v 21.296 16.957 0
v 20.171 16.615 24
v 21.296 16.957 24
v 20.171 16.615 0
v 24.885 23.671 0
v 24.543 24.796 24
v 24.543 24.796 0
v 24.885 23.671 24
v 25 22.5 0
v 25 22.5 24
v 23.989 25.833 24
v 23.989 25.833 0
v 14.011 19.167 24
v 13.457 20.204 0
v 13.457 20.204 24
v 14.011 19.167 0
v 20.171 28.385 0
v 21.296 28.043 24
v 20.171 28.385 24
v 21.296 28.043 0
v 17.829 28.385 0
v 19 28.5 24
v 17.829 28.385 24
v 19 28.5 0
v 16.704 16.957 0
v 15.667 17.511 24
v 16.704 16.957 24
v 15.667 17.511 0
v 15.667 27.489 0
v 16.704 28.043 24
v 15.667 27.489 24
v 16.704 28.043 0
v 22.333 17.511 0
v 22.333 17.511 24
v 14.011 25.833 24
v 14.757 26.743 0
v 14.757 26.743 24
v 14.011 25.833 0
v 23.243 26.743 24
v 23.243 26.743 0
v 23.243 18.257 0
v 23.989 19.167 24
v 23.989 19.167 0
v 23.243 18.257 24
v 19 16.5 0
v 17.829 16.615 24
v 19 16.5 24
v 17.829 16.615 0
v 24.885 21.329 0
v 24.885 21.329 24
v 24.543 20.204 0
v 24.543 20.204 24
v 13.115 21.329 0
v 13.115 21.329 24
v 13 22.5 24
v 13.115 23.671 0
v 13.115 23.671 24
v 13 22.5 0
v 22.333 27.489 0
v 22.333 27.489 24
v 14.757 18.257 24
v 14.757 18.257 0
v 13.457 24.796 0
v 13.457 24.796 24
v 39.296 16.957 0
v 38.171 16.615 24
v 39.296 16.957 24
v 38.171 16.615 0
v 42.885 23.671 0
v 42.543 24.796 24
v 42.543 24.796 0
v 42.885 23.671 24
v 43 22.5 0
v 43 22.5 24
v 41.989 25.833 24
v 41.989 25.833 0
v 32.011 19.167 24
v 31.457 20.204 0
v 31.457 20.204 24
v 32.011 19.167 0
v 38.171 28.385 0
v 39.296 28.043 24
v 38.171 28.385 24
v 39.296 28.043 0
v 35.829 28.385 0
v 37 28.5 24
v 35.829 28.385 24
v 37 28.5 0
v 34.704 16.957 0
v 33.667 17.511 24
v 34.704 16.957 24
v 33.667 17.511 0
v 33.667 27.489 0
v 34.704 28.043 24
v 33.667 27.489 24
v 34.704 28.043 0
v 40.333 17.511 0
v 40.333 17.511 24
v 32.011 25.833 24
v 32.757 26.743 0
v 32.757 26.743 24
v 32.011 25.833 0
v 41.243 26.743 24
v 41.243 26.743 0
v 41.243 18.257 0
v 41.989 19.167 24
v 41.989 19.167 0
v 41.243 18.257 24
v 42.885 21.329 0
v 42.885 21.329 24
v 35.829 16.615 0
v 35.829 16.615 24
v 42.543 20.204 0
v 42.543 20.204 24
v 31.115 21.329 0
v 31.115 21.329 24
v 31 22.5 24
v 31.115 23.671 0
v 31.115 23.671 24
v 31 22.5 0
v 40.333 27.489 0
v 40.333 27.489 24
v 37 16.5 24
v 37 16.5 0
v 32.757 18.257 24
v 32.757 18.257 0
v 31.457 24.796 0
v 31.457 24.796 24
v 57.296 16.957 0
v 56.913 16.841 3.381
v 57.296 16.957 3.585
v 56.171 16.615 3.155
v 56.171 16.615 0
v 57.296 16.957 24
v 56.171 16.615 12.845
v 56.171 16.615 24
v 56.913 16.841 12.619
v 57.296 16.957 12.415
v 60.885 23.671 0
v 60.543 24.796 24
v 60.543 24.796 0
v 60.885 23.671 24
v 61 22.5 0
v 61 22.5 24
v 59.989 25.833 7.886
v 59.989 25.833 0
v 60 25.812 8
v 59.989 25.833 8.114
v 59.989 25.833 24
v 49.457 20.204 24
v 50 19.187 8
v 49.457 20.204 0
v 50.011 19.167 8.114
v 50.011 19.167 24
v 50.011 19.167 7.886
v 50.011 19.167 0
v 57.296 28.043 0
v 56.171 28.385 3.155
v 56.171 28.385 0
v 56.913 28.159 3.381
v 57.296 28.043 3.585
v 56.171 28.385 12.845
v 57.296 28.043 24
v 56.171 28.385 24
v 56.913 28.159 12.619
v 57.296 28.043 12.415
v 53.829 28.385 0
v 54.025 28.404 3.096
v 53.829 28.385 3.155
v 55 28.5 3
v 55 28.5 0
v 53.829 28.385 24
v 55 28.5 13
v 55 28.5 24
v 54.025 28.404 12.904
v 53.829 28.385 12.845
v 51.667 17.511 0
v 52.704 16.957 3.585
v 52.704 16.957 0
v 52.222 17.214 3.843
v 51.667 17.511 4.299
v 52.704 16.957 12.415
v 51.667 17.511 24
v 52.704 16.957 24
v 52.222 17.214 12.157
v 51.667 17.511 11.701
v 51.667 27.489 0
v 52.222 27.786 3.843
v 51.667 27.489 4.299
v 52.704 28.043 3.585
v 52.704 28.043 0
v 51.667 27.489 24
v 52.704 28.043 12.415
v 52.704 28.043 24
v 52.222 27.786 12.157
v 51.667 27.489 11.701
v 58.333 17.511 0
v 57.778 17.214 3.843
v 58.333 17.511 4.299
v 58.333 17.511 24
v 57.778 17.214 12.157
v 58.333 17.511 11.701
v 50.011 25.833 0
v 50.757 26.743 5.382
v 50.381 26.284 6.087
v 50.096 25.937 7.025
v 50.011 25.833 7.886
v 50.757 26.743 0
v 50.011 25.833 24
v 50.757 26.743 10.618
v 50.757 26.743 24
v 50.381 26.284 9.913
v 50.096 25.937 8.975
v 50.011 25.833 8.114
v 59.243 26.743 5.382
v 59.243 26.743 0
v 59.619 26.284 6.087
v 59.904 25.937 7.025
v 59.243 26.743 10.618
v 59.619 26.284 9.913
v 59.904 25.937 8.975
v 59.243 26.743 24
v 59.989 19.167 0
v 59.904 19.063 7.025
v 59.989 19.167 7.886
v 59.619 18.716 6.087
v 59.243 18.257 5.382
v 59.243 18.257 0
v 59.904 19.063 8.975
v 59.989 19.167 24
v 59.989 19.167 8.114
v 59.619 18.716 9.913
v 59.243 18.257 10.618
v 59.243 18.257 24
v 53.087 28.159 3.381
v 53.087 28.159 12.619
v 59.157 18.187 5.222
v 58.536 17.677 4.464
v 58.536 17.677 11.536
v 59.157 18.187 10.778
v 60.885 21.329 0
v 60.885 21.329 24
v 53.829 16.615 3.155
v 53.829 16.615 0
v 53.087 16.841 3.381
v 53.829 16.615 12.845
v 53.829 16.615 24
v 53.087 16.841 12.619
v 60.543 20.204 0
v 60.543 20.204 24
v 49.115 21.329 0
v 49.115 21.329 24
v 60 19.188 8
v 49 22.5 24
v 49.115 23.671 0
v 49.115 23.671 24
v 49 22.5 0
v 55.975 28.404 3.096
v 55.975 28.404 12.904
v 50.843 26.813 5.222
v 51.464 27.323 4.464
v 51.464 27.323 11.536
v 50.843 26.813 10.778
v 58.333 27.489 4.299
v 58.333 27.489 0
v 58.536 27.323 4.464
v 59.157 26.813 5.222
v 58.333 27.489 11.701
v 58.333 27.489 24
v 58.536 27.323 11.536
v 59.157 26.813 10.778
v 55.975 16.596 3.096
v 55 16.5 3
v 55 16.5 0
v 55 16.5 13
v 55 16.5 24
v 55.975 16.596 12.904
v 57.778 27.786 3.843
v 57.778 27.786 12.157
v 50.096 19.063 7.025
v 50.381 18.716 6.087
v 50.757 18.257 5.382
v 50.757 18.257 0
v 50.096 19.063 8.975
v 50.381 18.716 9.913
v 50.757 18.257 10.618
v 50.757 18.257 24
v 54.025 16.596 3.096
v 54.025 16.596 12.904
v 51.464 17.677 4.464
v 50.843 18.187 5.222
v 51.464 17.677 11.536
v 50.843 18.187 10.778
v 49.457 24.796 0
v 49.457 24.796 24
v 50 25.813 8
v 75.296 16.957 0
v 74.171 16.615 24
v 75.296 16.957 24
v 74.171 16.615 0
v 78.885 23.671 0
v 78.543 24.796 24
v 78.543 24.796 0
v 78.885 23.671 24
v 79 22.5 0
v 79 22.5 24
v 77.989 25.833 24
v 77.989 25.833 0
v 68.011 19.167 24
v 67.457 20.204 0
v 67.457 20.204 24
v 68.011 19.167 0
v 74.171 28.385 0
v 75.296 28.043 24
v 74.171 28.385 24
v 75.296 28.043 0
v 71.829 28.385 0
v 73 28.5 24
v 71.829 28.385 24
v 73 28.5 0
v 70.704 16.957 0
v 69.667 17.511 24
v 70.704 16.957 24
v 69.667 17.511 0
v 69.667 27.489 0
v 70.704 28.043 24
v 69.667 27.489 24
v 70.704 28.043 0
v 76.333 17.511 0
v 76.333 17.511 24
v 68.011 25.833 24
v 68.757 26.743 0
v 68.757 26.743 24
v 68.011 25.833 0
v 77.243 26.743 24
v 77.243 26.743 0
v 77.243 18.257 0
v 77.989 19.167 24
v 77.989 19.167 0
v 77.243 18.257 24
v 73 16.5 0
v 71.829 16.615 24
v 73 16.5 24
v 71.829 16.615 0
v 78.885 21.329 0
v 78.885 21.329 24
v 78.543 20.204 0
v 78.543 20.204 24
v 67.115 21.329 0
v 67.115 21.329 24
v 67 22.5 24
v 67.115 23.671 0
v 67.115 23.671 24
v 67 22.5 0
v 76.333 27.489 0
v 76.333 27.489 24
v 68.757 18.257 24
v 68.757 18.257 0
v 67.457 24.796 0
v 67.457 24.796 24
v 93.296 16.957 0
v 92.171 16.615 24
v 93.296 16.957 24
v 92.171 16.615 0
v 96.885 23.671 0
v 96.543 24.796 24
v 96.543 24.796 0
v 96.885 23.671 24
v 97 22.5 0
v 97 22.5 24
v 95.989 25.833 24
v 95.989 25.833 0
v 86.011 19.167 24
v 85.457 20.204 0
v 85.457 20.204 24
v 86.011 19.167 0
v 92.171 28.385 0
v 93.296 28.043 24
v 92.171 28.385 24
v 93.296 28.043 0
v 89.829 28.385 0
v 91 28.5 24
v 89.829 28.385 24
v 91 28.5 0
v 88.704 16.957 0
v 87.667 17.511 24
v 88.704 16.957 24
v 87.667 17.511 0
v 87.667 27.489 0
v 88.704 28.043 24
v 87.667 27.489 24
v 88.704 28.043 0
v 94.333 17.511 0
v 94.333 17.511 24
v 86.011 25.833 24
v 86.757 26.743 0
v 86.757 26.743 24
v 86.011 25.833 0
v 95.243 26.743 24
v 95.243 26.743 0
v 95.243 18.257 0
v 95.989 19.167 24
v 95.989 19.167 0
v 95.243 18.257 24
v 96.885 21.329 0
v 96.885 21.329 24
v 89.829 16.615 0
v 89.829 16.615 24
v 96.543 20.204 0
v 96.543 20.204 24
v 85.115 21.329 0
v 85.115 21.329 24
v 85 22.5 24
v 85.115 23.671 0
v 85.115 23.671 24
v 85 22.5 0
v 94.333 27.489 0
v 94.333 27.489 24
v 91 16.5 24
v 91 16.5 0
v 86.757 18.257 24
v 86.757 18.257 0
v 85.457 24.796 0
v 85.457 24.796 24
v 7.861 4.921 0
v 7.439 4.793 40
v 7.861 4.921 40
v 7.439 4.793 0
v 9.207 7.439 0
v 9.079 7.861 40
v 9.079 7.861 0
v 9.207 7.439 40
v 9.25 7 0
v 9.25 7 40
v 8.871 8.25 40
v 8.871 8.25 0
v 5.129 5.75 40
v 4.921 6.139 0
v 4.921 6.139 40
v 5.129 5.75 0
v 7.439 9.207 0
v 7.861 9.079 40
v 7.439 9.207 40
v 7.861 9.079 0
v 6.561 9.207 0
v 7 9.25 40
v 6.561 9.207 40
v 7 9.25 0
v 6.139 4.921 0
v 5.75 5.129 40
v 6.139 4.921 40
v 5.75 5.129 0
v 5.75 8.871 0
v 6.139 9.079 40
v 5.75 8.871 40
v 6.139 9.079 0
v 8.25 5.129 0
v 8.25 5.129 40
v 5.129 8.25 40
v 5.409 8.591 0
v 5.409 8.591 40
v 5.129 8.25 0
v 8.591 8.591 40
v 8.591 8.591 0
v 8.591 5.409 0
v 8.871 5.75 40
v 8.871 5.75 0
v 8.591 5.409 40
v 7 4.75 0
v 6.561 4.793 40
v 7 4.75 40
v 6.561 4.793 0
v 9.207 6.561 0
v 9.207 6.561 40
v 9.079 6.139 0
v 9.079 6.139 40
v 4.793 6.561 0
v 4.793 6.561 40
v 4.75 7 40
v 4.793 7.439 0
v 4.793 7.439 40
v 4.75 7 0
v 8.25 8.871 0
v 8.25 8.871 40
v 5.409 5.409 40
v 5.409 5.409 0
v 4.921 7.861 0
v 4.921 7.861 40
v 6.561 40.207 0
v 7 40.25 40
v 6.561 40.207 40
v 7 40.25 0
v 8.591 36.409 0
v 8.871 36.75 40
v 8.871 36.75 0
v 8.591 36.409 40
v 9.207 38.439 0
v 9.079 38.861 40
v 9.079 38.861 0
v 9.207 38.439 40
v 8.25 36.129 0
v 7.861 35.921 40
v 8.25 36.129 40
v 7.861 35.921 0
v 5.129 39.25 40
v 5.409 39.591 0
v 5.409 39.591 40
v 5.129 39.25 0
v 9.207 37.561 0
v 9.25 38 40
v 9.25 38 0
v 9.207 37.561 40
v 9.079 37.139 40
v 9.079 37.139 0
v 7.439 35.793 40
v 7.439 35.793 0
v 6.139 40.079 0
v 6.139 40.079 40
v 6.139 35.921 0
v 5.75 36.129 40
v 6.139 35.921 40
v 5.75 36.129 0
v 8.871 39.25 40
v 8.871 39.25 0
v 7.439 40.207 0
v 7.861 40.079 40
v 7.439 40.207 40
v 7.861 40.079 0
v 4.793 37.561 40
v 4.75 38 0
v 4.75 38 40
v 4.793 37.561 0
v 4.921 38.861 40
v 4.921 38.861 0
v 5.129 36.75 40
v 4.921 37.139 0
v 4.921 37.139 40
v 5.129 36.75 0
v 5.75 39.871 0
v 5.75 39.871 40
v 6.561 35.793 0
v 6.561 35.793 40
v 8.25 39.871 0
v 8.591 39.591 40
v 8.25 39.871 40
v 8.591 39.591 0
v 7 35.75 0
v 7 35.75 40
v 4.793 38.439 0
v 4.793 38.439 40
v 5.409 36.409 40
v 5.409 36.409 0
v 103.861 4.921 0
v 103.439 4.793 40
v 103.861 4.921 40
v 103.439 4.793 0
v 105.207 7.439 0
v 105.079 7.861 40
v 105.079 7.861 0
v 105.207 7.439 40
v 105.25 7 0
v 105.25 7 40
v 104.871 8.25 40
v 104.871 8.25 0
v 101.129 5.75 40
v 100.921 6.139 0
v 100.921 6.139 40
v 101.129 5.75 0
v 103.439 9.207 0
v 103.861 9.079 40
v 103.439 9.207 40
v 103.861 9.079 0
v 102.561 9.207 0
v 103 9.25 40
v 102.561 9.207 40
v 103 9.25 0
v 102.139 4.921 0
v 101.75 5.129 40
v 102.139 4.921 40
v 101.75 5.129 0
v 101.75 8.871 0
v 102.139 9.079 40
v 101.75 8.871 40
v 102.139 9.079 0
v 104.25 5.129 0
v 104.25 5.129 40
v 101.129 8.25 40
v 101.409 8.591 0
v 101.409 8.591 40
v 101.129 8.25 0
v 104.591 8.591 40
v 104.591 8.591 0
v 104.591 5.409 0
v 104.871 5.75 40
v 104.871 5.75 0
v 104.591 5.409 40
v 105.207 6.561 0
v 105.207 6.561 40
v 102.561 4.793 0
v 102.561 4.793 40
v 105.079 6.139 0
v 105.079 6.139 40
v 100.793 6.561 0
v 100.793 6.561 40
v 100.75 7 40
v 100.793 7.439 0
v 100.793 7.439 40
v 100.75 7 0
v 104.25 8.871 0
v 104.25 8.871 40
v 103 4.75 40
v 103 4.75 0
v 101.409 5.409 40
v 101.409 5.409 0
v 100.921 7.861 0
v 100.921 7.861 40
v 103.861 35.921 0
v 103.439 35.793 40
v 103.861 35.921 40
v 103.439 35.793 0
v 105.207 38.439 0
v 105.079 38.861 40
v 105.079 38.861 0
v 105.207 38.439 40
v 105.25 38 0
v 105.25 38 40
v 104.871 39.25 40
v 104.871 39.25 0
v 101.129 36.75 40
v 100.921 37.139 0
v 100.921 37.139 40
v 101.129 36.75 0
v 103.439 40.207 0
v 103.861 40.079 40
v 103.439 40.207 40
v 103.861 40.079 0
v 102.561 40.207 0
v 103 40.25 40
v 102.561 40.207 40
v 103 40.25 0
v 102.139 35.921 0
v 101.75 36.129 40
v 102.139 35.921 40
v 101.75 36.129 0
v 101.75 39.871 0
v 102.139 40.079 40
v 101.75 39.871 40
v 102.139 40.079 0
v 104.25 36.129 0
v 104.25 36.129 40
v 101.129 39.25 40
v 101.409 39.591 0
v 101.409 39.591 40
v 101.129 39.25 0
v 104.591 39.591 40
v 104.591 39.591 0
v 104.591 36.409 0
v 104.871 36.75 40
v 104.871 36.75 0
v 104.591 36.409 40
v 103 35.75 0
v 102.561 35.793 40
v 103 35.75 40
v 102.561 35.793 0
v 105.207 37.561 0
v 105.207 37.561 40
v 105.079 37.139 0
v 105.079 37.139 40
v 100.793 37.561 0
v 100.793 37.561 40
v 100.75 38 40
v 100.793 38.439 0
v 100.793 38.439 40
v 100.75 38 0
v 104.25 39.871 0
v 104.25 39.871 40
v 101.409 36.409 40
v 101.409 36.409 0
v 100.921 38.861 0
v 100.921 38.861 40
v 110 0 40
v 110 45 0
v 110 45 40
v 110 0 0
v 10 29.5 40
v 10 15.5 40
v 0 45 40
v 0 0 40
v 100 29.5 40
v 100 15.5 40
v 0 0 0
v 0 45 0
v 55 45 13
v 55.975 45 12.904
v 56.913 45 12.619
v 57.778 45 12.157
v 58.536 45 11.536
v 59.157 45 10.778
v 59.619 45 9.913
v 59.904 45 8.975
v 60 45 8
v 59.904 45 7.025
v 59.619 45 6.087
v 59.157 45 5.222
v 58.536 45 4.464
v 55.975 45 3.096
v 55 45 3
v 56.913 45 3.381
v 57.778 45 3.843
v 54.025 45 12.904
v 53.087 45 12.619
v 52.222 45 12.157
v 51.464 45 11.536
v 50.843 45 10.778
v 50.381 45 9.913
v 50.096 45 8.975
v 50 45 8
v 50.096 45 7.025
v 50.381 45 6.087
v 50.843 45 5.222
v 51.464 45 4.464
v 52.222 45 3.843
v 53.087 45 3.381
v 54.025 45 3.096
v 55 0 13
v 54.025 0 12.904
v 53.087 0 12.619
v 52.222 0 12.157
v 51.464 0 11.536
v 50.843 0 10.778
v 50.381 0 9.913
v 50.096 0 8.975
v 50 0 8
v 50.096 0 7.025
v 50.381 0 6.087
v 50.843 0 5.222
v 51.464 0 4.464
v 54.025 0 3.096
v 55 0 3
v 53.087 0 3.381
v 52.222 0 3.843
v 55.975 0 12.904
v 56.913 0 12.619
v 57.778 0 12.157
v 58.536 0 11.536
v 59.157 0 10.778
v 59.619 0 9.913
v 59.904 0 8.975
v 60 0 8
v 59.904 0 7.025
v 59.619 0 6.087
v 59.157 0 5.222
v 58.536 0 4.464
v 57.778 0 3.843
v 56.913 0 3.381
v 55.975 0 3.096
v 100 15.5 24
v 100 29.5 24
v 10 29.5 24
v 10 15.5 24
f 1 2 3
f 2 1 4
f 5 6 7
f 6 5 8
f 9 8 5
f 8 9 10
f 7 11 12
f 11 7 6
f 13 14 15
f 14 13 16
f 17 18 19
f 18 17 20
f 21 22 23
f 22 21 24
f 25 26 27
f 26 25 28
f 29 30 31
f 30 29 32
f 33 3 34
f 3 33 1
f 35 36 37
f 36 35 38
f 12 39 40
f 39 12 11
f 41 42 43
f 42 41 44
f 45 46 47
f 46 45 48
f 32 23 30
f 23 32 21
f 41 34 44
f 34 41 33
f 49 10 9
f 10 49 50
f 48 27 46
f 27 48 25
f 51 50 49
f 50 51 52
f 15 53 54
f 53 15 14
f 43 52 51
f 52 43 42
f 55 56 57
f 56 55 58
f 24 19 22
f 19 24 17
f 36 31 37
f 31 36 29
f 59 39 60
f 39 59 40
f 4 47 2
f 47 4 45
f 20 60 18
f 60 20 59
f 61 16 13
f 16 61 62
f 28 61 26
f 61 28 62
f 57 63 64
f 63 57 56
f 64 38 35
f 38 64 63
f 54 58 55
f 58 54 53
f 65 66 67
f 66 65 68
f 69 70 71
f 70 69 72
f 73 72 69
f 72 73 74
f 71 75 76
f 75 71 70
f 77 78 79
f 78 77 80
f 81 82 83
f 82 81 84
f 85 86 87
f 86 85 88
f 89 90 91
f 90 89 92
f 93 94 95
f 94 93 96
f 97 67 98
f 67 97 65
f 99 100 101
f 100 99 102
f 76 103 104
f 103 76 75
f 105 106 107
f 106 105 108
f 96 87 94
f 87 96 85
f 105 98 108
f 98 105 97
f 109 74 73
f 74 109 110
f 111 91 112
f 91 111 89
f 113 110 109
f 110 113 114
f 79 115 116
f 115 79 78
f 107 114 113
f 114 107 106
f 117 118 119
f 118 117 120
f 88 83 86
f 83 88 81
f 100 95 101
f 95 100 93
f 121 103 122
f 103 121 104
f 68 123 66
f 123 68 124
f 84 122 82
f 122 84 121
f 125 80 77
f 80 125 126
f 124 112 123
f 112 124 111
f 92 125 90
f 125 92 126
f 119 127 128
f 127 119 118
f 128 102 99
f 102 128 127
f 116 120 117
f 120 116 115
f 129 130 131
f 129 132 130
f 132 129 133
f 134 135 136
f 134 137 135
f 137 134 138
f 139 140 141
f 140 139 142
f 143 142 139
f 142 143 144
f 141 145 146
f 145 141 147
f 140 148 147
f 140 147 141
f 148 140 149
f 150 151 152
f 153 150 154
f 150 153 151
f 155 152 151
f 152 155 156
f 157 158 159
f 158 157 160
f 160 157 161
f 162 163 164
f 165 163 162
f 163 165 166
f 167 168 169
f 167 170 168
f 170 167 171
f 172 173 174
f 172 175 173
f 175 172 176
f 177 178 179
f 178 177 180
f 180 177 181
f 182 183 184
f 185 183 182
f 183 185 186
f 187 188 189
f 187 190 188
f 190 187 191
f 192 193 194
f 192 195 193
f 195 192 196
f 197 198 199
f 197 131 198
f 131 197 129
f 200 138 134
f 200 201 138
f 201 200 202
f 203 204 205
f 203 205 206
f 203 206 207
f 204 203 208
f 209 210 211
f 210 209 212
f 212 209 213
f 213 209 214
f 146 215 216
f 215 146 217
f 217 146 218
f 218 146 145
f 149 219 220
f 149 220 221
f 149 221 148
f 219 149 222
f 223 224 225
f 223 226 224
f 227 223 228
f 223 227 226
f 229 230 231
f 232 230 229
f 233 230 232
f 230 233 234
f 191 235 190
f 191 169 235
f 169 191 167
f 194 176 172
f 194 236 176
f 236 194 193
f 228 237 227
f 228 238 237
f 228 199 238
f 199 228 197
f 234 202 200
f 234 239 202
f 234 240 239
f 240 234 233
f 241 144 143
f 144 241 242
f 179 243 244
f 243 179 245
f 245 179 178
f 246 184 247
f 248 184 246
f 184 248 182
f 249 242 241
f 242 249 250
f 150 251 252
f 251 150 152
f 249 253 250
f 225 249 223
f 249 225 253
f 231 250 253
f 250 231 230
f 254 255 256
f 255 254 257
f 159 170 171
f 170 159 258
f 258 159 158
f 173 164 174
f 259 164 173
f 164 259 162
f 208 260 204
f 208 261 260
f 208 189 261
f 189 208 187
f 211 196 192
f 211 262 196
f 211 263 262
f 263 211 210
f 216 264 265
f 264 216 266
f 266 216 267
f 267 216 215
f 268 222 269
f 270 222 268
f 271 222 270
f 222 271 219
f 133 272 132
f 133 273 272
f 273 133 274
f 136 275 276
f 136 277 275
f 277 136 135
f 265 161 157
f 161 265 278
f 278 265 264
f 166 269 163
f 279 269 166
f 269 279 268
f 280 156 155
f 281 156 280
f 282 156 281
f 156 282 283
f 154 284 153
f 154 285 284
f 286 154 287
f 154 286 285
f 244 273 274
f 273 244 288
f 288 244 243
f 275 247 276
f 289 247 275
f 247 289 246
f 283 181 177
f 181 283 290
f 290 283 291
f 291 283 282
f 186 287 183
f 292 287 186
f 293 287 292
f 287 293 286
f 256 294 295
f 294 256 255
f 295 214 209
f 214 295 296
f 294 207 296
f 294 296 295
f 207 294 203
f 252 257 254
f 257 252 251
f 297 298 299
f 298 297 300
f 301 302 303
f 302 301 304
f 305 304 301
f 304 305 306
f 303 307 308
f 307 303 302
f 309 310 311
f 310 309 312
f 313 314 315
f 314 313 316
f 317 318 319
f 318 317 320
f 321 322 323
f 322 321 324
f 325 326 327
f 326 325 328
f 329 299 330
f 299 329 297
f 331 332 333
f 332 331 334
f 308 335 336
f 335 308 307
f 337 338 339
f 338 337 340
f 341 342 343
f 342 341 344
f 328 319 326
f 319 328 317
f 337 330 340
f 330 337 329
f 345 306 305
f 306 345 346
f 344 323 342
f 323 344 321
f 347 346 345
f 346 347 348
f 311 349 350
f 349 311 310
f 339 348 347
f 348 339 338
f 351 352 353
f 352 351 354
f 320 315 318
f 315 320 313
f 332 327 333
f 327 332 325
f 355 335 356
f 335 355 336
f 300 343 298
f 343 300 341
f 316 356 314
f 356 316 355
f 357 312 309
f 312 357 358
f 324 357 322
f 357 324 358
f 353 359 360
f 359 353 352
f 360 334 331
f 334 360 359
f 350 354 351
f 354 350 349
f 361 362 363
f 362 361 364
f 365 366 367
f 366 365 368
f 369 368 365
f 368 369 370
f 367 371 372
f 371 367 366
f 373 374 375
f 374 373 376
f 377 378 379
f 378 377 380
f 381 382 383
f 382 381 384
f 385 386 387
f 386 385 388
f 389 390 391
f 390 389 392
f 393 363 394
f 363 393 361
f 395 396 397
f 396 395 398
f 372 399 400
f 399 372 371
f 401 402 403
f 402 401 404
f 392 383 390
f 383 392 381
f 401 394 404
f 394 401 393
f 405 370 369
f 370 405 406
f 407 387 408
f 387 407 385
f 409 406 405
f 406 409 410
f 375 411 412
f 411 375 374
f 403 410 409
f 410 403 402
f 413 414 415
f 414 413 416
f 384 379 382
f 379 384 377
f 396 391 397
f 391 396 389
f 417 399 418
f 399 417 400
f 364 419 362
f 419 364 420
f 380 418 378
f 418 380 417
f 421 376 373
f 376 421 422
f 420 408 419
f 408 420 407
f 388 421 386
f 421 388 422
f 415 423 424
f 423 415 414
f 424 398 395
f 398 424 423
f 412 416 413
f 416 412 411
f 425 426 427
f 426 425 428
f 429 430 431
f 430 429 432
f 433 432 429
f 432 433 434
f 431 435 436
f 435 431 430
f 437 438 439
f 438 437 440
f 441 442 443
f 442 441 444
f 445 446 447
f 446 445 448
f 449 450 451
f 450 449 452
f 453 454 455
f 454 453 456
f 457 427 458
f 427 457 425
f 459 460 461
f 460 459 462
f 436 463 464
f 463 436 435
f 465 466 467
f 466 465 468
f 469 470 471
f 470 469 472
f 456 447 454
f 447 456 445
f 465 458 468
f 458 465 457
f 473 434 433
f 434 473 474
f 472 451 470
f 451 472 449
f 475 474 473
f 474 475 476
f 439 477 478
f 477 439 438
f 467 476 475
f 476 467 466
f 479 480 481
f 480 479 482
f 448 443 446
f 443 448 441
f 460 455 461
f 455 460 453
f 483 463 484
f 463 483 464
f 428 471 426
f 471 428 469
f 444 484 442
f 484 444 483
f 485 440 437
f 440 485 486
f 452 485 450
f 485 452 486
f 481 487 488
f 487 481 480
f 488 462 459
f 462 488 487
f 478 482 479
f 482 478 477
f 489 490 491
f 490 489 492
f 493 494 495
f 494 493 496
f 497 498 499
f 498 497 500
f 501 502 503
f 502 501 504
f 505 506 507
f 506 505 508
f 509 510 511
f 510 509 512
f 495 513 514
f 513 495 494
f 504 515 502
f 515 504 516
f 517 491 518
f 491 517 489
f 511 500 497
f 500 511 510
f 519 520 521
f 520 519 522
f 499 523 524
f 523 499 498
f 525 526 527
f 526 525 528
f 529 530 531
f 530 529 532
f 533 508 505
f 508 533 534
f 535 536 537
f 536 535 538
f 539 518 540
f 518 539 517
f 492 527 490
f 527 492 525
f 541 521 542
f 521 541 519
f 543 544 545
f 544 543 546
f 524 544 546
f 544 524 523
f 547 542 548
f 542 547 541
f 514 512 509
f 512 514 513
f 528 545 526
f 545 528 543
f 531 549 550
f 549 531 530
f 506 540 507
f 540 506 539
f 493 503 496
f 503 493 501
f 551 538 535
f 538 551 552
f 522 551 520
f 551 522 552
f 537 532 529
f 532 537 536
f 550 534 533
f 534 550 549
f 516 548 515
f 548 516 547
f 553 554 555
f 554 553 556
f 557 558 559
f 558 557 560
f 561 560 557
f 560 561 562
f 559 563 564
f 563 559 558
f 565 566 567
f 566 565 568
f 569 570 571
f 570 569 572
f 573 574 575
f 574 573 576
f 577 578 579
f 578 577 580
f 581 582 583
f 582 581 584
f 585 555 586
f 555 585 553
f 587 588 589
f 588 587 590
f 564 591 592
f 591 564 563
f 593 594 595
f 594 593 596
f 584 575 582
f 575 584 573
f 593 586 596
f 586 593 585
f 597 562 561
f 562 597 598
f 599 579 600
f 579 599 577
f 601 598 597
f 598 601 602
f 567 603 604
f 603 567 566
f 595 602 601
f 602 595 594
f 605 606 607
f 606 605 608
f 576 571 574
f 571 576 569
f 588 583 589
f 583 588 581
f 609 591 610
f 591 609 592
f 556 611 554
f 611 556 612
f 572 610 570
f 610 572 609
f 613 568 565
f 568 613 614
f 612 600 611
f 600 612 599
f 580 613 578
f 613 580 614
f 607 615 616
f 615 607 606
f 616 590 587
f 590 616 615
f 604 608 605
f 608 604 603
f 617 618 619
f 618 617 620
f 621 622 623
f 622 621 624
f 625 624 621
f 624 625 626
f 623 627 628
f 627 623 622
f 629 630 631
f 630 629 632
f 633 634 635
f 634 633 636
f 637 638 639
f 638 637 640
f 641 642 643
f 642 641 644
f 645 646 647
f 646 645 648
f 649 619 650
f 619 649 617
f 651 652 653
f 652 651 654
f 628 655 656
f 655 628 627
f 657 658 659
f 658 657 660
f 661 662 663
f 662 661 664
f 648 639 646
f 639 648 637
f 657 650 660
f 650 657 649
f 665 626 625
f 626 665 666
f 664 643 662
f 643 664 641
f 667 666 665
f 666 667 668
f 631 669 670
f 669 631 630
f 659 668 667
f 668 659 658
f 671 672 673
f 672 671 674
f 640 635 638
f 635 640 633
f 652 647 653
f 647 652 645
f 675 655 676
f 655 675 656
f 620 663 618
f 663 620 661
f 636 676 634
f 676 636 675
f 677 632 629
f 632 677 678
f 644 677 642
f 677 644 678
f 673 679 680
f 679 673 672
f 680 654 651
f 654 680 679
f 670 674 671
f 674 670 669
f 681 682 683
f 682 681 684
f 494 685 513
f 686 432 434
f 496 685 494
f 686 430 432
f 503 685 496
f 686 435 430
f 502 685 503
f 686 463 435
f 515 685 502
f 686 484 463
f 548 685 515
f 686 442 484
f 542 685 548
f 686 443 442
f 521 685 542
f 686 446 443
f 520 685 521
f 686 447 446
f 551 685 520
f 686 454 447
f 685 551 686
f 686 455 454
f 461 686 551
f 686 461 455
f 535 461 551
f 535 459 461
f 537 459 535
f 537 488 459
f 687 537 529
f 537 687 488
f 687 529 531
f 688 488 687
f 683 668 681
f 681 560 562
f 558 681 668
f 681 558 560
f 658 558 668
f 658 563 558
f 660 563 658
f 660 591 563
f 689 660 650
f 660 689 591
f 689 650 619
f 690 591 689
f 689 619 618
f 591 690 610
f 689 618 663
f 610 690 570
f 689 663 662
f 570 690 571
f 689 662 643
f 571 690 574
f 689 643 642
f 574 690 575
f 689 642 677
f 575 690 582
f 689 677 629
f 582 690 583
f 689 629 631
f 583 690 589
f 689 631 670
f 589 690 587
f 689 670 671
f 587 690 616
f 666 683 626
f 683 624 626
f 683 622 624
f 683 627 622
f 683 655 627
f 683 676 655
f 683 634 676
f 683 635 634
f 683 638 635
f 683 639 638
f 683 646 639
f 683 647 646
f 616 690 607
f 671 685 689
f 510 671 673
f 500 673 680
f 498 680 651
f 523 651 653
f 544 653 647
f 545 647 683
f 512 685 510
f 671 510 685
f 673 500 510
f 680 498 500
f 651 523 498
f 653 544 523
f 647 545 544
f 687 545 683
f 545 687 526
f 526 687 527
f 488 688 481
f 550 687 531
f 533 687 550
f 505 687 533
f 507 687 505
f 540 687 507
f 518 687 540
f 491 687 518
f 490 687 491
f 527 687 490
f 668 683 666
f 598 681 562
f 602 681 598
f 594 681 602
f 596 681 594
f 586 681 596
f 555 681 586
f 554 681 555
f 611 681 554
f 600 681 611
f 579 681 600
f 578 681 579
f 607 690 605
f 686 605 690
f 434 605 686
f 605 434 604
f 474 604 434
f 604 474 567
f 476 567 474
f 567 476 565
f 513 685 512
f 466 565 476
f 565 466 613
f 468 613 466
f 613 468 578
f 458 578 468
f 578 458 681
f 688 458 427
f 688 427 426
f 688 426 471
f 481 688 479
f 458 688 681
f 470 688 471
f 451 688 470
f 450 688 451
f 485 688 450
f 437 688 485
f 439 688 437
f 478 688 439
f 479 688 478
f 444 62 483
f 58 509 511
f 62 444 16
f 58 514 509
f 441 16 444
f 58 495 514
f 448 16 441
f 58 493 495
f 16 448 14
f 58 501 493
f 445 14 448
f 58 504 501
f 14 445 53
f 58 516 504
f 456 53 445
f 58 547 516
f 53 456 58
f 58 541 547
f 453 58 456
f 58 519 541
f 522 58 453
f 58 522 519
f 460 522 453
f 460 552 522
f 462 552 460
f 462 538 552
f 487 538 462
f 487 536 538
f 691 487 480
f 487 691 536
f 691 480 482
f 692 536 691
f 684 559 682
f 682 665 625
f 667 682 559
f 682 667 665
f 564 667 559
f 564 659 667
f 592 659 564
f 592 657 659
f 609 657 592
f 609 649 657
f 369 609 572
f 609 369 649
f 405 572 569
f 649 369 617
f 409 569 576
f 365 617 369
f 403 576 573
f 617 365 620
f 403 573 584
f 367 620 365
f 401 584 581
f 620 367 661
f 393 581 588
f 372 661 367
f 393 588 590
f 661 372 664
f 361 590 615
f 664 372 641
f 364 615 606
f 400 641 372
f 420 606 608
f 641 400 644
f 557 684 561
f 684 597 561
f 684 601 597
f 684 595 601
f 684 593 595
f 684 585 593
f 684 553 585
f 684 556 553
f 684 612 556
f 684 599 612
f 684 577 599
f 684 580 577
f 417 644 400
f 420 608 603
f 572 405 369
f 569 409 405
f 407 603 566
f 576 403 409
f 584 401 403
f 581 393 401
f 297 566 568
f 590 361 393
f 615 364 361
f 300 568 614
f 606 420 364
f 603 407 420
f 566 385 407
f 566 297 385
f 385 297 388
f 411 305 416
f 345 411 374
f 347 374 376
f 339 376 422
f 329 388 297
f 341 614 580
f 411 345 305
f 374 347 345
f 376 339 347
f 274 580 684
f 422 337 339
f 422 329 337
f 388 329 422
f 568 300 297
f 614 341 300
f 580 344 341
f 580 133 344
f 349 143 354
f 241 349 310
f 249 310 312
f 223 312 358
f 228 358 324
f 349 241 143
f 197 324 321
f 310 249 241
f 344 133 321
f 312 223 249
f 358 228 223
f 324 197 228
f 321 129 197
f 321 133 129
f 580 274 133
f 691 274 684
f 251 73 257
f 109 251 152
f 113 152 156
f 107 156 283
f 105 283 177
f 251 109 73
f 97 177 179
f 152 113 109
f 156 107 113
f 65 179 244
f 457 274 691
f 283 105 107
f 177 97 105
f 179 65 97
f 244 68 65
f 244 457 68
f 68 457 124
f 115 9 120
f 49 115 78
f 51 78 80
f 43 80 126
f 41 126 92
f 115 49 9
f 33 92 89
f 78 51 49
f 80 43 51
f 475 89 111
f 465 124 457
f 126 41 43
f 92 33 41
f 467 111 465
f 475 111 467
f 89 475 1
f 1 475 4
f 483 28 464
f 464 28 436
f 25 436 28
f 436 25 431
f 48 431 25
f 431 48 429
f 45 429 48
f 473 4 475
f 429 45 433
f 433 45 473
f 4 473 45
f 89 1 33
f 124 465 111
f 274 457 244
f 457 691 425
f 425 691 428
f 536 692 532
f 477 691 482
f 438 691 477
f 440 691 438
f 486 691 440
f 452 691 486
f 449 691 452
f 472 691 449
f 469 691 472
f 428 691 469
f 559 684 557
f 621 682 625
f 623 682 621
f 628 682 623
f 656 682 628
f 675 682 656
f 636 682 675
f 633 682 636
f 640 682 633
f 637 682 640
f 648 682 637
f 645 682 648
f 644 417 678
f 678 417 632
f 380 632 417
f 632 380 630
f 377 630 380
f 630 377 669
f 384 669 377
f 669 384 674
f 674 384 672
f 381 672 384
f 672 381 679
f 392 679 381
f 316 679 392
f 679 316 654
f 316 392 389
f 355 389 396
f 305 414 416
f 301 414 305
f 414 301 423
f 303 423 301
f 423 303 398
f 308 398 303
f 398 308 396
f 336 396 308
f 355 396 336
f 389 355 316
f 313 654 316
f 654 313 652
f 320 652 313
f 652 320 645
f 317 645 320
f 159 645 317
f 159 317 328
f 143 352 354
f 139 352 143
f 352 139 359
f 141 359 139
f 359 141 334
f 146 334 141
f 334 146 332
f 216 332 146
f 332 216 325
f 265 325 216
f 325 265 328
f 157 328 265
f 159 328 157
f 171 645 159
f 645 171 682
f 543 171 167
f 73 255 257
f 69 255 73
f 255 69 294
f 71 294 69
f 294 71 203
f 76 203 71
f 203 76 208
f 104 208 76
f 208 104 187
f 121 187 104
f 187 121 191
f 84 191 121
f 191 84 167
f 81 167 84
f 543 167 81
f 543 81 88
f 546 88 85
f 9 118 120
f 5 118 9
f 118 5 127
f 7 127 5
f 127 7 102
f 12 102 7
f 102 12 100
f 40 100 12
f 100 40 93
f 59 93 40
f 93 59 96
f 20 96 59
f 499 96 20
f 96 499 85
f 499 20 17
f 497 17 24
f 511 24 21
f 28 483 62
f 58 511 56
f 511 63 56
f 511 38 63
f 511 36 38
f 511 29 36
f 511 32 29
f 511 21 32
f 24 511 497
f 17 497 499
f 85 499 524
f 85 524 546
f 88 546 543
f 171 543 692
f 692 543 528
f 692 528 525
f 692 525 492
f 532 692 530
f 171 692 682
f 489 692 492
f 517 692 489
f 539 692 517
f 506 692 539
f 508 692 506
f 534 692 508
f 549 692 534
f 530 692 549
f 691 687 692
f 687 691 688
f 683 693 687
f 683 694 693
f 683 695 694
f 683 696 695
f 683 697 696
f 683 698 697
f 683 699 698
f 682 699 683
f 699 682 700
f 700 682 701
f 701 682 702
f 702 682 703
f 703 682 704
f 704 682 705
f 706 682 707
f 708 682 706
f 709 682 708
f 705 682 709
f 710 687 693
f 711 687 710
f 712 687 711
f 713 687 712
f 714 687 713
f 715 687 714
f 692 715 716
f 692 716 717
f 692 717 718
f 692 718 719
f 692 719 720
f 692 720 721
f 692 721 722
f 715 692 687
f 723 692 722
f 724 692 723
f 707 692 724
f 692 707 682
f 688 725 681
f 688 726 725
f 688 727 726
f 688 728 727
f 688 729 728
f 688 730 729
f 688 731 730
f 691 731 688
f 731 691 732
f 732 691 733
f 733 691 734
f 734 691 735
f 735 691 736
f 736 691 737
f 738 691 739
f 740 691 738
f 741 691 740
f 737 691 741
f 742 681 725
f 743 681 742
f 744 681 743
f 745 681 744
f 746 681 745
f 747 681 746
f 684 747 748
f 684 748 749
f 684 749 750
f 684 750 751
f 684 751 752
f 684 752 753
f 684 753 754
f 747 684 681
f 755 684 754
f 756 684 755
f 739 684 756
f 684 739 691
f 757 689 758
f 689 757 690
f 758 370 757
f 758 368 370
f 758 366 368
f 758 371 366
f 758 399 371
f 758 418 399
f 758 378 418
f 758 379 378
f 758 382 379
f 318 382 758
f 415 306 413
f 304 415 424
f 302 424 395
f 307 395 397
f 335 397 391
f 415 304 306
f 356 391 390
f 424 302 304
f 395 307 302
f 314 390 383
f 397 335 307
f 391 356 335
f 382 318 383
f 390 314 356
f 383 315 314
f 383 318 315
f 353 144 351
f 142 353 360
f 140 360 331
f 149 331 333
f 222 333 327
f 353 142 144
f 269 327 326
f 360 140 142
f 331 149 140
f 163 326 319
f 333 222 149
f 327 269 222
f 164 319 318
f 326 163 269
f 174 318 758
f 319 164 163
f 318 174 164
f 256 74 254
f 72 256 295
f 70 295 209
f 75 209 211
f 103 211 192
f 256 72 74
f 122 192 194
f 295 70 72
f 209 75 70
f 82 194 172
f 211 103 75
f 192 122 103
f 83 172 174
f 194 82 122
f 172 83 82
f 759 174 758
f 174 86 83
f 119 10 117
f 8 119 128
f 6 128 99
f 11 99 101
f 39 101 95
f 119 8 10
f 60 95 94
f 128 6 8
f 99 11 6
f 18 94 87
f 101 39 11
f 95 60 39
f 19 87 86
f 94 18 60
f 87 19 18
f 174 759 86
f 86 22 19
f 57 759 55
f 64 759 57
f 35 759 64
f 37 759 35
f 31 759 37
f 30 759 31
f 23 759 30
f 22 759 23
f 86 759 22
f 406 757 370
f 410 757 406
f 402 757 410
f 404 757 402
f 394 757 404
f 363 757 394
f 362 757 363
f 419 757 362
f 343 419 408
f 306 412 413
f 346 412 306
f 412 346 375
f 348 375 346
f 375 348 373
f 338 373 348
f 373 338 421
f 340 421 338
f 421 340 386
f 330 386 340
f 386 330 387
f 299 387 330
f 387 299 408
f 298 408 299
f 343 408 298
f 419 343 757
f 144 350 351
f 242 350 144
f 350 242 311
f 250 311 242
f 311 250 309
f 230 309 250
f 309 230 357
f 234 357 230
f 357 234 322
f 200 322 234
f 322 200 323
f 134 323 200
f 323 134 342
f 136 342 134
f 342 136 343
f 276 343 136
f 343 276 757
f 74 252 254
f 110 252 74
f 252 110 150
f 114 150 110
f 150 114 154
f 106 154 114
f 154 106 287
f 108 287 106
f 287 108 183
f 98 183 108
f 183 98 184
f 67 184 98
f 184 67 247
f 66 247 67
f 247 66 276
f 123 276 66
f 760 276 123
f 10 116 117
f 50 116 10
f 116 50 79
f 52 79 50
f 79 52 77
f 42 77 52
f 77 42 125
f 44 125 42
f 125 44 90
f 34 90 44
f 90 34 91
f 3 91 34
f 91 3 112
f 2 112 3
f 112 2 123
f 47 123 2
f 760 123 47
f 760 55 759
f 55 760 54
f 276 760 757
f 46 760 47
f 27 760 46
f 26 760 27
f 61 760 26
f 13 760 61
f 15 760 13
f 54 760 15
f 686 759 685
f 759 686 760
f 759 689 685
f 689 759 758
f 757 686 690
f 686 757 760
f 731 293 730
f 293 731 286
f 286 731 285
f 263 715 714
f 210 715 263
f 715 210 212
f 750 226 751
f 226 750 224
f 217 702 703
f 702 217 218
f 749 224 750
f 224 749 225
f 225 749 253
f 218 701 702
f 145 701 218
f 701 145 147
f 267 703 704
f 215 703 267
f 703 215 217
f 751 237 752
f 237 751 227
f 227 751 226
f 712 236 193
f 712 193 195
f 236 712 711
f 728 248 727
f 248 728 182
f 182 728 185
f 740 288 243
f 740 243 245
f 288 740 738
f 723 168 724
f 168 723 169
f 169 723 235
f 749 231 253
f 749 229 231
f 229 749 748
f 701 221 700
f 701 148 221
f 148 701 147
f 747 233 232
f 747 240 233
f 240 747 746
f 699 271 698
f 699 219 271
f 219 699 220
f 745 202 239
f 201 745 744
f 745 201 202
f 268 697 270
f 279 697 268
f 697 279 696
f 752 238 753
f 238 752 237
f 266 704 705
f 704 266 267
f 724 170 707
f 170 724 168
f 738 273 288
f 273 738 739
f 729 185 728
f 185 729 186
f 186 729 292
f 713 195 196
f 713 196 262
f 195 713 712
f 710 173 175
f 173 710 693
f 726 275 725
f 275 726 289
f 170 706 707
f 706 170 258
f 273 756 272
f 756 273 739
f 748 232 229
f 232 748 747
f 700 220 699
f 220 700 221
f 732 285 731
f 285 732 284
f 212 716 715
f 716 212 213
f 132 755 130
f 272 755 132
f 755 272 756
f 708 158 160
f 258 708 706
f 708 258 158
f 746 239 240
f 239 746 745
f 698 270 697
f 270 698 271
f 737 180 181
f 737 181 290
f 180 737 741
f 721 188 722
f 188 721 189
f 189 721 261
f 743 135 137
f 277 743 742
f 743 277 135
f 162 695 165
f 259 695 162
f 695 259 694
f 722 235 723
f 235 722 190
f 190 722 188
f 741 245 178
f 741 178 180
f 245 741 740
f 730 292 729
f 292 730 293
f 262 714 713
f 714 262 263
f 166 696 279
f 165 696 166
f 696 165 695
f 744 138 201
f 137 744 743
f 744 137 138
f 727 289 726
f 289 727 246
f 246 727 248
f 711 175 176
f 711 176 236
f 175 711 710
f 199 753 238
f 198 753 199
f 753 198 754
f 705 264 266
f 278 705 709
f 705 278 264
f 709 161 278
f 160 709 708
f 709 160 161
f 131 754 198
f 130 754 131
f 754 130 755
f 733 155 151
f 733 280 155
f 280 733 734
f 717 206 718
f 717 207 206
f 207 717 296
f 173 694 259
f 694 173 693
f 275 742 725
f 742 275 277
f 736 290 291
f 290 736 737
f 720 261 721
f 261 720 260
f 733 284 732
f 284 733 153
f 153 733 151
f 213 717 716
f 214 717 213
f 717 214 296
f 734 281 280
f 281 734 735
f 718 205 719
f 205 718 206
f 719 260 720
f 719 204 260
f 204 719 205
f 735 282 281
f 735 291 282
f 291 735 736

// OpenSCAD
$fn = 32;

// ----------------------------------------------------------------------
// Manifold block: side_outlet manifold
// ----------------------------------------------------------------------

// --- parameters (mm) ---
block_l = 110;            // block length, X
block_w = 45;             // block width, Y
block_h = 40;             // block height, Z
port_d = 12;              // port bore diameter
port_pitch = 18;          // port pitch along X
gallery_d = 14;           // top gallery width, Y
gallery_depth = 16;       // gallery pocket depth
wall_p = 10;              // gallery end wall thickness, X
mnt_d = 4.5;              // mounting hole diameter
mnt_in = 7;               // mounting hole inset from the edges
out_d = 10;               // outlet bore diameter
out_z = 8;                // outlet axis height
fit_tol = 0.02;           // tolerance for press fits, mm
free_tol = 0.2;           // tolerance for clearance fits, mm

n_ports = 5;  // ports in the row
port_x0 = (block_l - (n_ports - 1) * port_pitch) / 2;  // first port X

difference() {
  cube([block_l, block_w, block_h]);
  for (i = [0 : n_ports - 1])
    translate([port_x0 + i * port_pitch, block_w / 2, -1])
      cylinder(h = block_h + 2, d = port_d);
  translate([wall_p, block_w / 2 - gallery_d / 2, block_h - gallery_depth])
    cube([block_l - 2 * wall_p, gallery_d, gallery_depth + 1]);
  for (cx = [mnt_in, block_l - mnt_in])
    for (cy = [mnt_in, block_w - mnt_in])
      translate([cx, cy, -1]) cylinder(h = block_h + 2, d = mnt_d);
  translate([block_l / 2, -1, out_z]) rotate([-90, 0, 0])
    cylinder(h = block_w + 2, d = out_d);
}
